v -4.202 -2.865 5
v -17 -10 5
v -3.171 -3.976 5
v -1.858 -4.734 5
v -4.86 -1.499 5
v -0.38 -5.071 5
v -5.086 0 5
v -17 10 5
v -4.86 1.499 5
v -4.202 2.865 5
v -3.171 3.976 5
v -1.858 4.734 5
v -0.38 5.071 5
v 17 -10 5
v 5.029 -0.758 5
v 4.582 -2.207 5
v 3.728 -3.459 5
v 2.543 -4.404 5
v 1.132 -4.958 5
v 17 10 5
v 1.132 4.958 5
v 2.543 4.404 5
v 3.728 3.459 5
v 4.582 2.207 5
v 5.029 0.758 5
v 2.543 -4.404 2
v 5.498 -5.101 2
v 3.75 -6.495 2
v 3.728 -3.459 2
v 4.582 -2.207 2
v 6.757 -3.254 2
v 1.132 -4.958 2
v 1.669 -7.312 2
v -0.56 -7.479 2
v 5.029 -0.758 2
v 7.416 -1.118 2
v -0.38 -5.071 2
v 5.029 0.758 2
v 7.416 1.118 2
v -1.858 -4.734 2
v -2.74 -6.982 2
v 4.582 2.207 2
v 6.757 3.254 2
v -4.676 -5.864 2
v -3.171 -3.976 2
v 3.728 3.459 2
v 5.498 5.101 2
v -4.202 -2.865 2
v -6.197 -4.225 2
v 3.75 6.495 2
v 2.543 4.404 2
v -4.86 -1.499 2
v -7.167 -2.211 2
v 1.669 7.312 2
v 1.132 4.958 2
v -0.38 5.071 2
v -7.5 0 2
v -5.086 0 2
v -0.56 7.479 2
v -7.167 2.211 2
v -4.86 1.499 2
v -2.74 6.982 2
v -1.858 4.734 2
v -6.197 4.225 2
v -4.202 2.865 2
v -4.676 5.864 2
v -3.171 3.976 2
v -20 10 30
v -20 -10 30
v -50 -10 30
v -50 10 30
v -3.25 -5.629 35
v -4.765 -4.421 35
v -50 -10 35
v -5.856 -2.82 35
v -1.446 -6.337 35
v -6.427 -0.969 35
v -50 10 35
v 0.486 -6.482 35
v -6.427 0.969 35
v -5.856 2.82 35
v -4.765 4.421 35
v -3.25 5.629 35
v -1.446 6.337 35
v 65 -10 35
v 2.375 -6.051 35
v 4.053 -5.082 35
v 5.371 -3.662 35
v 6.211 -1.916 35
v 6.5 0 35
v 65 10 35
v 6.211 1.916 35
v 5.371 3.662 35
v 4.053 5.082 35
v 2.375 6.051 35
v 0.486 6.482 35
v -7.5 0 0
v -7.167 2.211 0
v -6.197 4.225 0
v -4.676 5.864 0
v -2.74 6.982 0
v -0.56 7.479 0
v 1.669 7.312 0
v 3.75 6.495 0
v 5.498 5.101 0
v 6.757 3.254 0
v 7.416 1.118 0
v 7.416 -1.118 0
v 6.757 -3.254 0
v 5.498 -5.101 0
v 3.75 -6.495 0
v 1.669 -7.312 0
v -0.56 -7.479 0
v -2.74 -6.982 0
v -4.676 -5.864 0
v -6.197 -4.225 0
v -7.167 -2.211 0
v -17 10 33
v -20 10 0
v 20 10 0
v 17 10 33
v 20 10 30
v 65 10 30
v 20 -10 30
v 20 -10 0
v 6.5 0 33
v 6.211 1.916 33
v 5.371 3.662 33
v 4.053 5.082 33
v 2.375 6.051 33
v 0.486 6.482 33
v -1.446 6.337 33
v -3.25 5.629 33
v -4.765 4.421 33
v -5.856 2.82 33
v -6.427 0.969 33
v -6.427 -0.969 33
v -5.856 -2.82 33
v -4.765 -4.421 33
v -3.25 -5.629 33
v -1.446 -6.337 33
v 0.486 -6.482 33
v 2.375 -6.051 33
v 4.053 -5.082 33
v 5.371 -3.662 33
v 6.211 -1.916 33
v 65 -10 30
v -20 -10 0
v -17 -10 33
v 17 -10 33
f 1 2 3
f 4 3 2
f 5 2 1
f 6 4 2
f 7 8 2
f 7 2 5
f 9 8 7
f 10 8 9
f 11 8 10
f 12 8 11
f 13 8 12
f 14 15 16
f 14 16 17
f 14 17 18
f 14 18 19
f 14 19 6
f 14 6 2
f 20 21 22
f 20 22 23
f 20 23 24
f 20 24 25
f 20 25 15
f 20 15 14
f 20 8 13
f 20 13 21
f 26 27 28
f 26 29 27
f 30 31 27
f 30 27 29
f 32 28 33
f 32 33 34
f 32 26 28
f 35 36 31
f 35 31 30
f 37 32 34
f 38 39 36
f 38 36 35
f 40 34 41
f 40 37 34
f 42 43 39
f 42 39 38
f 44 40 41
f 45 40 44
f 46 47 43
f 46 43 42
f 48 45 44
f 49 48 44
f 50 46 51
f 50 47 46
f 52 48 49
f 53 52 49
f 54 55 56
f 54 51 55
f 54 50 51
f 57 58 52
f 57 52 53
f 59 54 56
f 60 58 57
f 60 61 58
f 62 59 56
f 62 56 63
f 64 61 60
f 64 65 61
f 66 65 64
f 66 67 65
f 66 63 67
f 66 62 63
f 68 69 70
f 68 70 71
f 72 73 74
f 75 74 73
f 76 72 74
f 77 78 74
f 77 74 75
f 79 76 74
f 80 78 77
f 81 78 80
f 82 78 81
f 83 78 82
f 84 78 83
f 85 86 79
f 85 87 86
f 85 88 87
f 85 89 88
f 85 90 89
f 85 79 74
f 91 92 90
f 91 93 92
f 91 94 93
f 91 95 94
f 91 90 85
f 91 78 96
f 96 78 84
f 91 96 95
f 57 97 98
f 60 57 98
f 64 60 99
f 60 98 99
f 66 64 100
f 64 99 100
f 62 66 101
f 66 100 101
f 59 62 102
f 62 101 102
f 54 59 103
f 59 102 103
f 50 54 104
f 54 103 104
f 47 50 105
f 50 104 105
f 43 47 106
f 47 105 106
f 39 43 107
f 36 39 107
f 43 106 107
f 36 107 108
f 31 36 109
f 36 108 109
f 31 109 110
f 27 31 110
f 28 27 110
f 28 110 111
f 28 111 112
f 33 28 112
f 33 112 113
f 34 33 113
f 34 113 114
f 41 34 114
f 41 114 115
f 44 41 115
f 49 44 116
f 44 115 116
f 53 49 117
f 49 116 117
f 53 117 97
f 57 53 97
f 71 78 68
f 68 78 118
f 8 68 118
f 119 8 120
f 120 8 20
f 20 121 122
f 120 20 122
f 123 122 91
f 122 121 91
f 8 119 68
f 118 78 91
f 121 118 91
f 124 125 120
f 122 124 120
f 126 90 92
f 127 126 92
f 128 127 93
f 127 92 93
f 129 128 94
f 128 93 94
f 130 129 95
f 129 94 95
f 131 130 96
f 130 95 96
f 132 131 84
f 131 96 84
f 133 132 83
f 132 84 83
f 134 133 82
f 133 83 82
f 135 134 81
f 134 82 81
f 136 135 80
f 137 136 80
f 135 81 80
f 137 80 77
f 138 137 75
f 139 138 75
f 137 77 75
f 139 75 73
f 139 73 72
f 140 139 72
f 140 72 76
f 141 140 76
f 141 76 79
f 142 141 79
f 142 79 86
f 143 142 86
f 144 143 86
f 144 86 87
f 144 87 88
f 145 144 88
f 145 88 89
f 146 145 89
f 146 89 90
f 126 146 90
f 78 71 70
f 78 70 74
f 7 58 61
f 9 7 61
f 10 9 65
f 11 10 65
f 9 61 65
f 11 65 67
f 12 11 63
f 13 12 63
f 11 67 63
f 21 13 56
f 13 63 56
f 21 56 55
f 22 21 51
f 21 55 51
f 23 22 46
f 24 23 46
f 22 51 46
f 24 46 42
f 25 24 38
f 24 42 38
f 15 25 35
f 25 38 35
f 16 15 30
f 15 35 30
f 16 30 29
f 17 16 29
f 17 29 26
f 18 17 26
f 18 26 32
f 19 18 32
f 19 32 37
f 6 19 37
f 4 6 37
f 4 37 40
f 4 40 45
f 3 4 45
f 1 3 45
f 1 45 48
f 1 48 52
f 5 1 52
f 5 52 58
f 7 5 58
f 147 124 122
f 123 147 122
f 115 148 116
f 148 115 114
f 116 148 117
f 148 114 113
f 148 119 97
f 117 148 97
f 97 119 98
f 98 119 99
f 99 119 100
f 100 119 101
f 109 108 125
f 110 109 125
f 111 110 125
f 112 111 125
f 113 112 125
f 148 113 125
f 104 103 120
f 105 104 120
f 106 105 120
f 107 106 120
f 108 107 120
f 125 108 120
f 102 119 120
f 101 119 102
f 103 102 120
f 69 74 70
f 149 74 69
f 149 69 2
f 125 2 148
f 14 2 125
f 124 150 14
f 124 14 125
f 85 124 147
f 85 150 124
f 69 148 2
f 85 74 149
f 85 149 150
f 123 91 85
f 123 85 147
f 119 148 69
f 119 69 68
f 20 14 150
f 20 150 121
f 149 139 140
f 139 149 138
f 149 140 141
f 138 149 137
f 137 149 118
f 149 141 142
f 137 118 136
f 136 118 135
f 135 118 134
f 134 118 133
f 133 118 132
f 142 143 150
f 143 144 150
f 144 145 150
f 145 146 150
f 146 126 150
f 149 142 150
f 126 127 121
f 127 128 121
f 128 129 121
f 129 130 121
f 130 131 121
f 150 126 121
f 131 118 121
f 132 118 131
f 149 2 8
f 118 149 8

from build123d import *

# Parameters (mm, degrees)
SKETCH1_W           = 40
SKETCH1_H           = 20
BOSS_EXTRUDE1_DEPTH = 5
SKETCH2_W           = 3
SKETCH2_H           = 20
BOSS_EXTRUDE2_DEPTH = 30
SKETCH3_W           = 5
SKETCH3_H           = 20
BOSS_EXTRUDE3_DEPTH = 45
SKETCH4_W           = 5
SKETCH4_H           = 20
BOSS_EXTRUDE4_DEPTH = 30
SKETCH5_W           = 34
SKETCH5_H           = 20
BOSS_EXTRUDE5_DEPTH = 2
SKETCH6_R           = 7.5
CUT_EXTRUDE1_DEPTH  = 2
SKETCH7_R           = 5.085514488
CUT_EXTRUDE2_DEPTH  = 5
SKETCH8_R           = 6.5
CUT_EXTRUDE3_DEPTH  = 13


with BuildPart() as part:
    # Sketch1 → Boss-Extrude1 (new body)
    with BuildSketch(Plane.XY):
        Rectangle(SKETCH1_W, SKETCH1_H)
    extrude(amount=BOSS_EXTRUDE1_DEPTH)

    # Sketch2 → Boss-Extrude2 (add)
    with BuildSketch(Plane.XY.offset(5)):
        with Locations((-18.5, 0)):
            Rectangle(SKETCH2_W, SKETCH2_H)
        with Locations((18.5, 0)):
            Rectangle(SKETCH2_W, SKETCH2_H)
    extrude(amount=BOSS_EXTRUDE2_DEPTH)

    # Sketch3 → Boss-Extrude3 (add)
    with BuildSketch(Plane(origin=(20, 0, 0), x_dir=(0, 0, -1), z_dir=(1, 0, 0))):
        with Locations((-32.5, 0)):
            Rectangle(SKETCH3_W, SKETCH3_H)
    extrude(amount=BOSS_EXTRUDE3_DEPTH)

    # Sketch4 → Boss-Extrude4 (add)
    with BuildSketch(Plane.ZY.offset(20)):
        with Locations((32.5, 0)):
            Rectangle(SKETCH4_W, SKETCH4_H)
    extrude(amount=BOSS_EXTRUDE4_DEPTH)

    # Sketch5 → Boss-Extrude5 (add)
    with BuildSketch(Plane.XY.offset(35)):
        Rectangle(SKETCH5_W, SKETCH5_H)
    extrude(amount=-BOSS_EXTRUDE5_DEPTH)

    # Sketch6 → Cut-Extrude1 (cut)
    with BuildSketch(Plane(origin=(0, 0, 0), x_dir=(-1, 0, 0), z_dir=(0, 0, -1))):
        Circle(SKETCH6_R)
    extrude(amount=-CUT_EXTRUDE1_DEPTH, mode=Mode.SUBTRACT)

    # Sketch7 → Cut-Extrude2 (cut)
    with BuildSketch(Plane(origin=(0, 0, 2), x_dir=(-1, 0, 0), z_dir=(0, 0, -1))):
        Circle(SKETCH7_R)
    extrude(amount=-CUT_EXTRUDE2_DEPTH, mode=Mode.SUBTRACT)

    # Sketch8 → Cut-Extrude3 (cut)
    with BuildSketch(Plane.XY.offset(35)):
        Circle(SKETCH8_R)
    extrude(amount=-CUT_EXTRUDE3_DEPTH, mode=Mode.SUBTRACT)


solid = part.part
